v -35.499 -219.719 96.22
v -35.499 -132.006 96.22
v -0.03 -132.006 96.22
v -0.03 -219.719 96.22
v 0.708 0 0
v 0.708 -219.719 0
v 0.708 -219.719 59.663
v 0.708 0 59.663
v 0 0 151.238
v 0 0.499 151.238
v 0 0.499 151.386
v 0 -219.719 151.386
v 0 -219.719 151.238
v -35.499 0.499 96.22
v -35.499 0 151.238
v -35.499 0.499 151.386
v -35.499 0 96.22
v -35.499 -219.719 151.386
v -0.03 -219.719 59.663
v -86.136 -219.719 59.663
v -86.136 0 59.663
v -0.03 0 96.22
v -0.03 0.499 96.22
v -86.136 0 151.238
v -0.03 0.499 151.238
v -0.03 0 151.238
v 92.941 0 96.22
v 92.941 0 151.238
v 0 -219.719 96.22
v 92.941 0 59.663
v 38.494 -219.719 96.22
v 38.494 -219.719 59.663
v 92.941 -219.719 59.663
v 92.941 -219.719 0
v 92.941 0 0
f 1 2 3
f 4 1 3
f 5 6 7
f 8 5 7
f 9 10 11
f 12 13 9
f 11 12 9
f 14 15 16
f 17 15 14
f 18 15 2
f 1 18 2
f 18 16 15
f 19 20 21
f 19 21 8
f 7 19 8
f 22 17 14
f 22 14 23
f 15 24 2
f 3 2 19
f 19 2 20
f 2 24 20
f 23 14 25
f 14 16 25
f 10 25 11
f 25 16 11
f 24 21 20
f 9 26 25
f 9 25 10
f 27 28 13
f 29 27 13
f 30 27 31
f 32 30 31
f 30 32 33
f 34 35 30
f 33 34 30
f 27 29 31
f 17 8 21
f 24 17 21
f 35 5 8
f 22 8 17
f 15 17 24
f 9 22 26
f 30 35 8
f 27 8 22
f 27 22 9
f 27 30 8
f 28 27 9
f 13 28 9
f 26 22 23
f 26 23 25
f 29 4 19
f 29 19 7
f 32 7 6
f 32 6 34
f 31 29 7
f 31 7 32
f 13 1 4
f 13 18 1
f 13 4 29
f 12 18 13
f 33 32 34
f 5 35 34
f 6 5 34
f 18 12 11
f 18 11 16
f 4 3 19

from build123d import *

# Parameters (mm, degrees)
F0_W      = 92.9407775402
F0_H      = 151.2379273772
F1_DEPTH  = 219.7186052799
F3_DEPTH  = 55.0180487335
F4_DEPTH  = 86.1361920834
F6_DEPTH  = 36.5569889545
F8_DEPTH  = 101.3751477003
F9_W      = 86.8442915817
F9_H      = 59.6628896892
F10_DEPTH = 283.972
F12_DEPTH = 86.106
F14_DEPTH = 220.218


with BuildPart() as f1:
    # F0 (on Front) → F1 (new body)
    with BuildSketch(Plane.XZ):
        with Locations((46.4703887701, 75.6189636886)):
            Rectangle(F0_W, F0_H)
    extrude(amount=F1_DEPTH)

    # F2 (on face) → F3 (cut)
    with BuildSketch(Plane.XY.offset(151.2379273772)):
        Polygon((92.9407775402, -219.7186052799), (92.9407775402, 0), (0, -219.7186052799), align=None)
    extrude(amount=-F3_DEPTH, mode=Mode.SUBTRACT)

    # F4 (add): a face of the model
    f4_faces = [f1.faces().sort_by_distance(p)[0] for p in [
        (0, -109.85930264, 75.6189636886),
    ]]
    extrude(f4_faces, amount=F4_DEPTH)

    # F5 (on face) → F6 (cut)
    with BuildSketch(Plane.XY.offset(96.2198786438)):
        Polygon((158.591479063, 33.0015420914), (92.9407775402, 0), (31.3818752766, -248.4212368727), (158.591479063, -248.4212368727), align=None)
        Polygon((158.591479063, 33.0015420914), (92.9407775402, 0), (92.9407775402, -219.7186052799), (38.4944012231, -219.7186052799), (31.3818752766, -248.4212368727), (158.591479063, -248.4212368727), align=None)
    extrude(amount=-F6_DEPTH, mode=Mode.SUBTRACT)

    # F7 (on face) → F8 (cut)
    with BuildSketch(Plane(origin=(-86.1361920834, 0, 0), x_dir=(0, -1, 0), z_dir=(-1, 0, 0))):
        Polygon((29.3830856681, 269.2216336727), (0, 151.2379273772), (219.7186052799, 151.2379273772), (219.7186052799, 65.060840155), (247.8701323271, 54.019369185), (303.3900067808, 195.5738098548), align=None)
    extrude(amount=-F8_DEPTH, mode=Mode.SUBTRACT)

    # F9 (on face) → F10 (cut)
    with BuildSketch(Plane.XZ.offset(219.7186052799)):
        with Locations((-42.7140462925, 29.8314448446)):
            Rectangle(F9_W, F9_H)
    extrude(amount=-F10_DEPTH, mode=Mode.SUBTRACT)

    # F11 (on face) → F12 (cut)
    with BuildSketch(Plane(origin=(-86.1361920834, 0, 0), x_dir=(0, -1, 0), z_dir=(-1, 0, 0))):
        Polygon((219.7186052799, 151.2379273772), (0, 151.2379273772), (219.7186052799, 59.6628896892), align=None)
    extrude(amount=-F12_DEPTH, mode=Mode.SUBTRACT)

    # F13 (on face) → F14 (join)
    with BuildSketch(Plane.XZ.offset(219.7186052799)):
        Polygon((-35.4988574982, 96.2198786438), (-0.0301920834, 96.2198786438), (-0.0301920834, 151.2379273772), (0, 151.2379273772), (0, 151.3858735561), (-35.4988574982, 151.3858735561), align=None)
    extrude(amount=-F14_DEPTH)


solid = f1.part
